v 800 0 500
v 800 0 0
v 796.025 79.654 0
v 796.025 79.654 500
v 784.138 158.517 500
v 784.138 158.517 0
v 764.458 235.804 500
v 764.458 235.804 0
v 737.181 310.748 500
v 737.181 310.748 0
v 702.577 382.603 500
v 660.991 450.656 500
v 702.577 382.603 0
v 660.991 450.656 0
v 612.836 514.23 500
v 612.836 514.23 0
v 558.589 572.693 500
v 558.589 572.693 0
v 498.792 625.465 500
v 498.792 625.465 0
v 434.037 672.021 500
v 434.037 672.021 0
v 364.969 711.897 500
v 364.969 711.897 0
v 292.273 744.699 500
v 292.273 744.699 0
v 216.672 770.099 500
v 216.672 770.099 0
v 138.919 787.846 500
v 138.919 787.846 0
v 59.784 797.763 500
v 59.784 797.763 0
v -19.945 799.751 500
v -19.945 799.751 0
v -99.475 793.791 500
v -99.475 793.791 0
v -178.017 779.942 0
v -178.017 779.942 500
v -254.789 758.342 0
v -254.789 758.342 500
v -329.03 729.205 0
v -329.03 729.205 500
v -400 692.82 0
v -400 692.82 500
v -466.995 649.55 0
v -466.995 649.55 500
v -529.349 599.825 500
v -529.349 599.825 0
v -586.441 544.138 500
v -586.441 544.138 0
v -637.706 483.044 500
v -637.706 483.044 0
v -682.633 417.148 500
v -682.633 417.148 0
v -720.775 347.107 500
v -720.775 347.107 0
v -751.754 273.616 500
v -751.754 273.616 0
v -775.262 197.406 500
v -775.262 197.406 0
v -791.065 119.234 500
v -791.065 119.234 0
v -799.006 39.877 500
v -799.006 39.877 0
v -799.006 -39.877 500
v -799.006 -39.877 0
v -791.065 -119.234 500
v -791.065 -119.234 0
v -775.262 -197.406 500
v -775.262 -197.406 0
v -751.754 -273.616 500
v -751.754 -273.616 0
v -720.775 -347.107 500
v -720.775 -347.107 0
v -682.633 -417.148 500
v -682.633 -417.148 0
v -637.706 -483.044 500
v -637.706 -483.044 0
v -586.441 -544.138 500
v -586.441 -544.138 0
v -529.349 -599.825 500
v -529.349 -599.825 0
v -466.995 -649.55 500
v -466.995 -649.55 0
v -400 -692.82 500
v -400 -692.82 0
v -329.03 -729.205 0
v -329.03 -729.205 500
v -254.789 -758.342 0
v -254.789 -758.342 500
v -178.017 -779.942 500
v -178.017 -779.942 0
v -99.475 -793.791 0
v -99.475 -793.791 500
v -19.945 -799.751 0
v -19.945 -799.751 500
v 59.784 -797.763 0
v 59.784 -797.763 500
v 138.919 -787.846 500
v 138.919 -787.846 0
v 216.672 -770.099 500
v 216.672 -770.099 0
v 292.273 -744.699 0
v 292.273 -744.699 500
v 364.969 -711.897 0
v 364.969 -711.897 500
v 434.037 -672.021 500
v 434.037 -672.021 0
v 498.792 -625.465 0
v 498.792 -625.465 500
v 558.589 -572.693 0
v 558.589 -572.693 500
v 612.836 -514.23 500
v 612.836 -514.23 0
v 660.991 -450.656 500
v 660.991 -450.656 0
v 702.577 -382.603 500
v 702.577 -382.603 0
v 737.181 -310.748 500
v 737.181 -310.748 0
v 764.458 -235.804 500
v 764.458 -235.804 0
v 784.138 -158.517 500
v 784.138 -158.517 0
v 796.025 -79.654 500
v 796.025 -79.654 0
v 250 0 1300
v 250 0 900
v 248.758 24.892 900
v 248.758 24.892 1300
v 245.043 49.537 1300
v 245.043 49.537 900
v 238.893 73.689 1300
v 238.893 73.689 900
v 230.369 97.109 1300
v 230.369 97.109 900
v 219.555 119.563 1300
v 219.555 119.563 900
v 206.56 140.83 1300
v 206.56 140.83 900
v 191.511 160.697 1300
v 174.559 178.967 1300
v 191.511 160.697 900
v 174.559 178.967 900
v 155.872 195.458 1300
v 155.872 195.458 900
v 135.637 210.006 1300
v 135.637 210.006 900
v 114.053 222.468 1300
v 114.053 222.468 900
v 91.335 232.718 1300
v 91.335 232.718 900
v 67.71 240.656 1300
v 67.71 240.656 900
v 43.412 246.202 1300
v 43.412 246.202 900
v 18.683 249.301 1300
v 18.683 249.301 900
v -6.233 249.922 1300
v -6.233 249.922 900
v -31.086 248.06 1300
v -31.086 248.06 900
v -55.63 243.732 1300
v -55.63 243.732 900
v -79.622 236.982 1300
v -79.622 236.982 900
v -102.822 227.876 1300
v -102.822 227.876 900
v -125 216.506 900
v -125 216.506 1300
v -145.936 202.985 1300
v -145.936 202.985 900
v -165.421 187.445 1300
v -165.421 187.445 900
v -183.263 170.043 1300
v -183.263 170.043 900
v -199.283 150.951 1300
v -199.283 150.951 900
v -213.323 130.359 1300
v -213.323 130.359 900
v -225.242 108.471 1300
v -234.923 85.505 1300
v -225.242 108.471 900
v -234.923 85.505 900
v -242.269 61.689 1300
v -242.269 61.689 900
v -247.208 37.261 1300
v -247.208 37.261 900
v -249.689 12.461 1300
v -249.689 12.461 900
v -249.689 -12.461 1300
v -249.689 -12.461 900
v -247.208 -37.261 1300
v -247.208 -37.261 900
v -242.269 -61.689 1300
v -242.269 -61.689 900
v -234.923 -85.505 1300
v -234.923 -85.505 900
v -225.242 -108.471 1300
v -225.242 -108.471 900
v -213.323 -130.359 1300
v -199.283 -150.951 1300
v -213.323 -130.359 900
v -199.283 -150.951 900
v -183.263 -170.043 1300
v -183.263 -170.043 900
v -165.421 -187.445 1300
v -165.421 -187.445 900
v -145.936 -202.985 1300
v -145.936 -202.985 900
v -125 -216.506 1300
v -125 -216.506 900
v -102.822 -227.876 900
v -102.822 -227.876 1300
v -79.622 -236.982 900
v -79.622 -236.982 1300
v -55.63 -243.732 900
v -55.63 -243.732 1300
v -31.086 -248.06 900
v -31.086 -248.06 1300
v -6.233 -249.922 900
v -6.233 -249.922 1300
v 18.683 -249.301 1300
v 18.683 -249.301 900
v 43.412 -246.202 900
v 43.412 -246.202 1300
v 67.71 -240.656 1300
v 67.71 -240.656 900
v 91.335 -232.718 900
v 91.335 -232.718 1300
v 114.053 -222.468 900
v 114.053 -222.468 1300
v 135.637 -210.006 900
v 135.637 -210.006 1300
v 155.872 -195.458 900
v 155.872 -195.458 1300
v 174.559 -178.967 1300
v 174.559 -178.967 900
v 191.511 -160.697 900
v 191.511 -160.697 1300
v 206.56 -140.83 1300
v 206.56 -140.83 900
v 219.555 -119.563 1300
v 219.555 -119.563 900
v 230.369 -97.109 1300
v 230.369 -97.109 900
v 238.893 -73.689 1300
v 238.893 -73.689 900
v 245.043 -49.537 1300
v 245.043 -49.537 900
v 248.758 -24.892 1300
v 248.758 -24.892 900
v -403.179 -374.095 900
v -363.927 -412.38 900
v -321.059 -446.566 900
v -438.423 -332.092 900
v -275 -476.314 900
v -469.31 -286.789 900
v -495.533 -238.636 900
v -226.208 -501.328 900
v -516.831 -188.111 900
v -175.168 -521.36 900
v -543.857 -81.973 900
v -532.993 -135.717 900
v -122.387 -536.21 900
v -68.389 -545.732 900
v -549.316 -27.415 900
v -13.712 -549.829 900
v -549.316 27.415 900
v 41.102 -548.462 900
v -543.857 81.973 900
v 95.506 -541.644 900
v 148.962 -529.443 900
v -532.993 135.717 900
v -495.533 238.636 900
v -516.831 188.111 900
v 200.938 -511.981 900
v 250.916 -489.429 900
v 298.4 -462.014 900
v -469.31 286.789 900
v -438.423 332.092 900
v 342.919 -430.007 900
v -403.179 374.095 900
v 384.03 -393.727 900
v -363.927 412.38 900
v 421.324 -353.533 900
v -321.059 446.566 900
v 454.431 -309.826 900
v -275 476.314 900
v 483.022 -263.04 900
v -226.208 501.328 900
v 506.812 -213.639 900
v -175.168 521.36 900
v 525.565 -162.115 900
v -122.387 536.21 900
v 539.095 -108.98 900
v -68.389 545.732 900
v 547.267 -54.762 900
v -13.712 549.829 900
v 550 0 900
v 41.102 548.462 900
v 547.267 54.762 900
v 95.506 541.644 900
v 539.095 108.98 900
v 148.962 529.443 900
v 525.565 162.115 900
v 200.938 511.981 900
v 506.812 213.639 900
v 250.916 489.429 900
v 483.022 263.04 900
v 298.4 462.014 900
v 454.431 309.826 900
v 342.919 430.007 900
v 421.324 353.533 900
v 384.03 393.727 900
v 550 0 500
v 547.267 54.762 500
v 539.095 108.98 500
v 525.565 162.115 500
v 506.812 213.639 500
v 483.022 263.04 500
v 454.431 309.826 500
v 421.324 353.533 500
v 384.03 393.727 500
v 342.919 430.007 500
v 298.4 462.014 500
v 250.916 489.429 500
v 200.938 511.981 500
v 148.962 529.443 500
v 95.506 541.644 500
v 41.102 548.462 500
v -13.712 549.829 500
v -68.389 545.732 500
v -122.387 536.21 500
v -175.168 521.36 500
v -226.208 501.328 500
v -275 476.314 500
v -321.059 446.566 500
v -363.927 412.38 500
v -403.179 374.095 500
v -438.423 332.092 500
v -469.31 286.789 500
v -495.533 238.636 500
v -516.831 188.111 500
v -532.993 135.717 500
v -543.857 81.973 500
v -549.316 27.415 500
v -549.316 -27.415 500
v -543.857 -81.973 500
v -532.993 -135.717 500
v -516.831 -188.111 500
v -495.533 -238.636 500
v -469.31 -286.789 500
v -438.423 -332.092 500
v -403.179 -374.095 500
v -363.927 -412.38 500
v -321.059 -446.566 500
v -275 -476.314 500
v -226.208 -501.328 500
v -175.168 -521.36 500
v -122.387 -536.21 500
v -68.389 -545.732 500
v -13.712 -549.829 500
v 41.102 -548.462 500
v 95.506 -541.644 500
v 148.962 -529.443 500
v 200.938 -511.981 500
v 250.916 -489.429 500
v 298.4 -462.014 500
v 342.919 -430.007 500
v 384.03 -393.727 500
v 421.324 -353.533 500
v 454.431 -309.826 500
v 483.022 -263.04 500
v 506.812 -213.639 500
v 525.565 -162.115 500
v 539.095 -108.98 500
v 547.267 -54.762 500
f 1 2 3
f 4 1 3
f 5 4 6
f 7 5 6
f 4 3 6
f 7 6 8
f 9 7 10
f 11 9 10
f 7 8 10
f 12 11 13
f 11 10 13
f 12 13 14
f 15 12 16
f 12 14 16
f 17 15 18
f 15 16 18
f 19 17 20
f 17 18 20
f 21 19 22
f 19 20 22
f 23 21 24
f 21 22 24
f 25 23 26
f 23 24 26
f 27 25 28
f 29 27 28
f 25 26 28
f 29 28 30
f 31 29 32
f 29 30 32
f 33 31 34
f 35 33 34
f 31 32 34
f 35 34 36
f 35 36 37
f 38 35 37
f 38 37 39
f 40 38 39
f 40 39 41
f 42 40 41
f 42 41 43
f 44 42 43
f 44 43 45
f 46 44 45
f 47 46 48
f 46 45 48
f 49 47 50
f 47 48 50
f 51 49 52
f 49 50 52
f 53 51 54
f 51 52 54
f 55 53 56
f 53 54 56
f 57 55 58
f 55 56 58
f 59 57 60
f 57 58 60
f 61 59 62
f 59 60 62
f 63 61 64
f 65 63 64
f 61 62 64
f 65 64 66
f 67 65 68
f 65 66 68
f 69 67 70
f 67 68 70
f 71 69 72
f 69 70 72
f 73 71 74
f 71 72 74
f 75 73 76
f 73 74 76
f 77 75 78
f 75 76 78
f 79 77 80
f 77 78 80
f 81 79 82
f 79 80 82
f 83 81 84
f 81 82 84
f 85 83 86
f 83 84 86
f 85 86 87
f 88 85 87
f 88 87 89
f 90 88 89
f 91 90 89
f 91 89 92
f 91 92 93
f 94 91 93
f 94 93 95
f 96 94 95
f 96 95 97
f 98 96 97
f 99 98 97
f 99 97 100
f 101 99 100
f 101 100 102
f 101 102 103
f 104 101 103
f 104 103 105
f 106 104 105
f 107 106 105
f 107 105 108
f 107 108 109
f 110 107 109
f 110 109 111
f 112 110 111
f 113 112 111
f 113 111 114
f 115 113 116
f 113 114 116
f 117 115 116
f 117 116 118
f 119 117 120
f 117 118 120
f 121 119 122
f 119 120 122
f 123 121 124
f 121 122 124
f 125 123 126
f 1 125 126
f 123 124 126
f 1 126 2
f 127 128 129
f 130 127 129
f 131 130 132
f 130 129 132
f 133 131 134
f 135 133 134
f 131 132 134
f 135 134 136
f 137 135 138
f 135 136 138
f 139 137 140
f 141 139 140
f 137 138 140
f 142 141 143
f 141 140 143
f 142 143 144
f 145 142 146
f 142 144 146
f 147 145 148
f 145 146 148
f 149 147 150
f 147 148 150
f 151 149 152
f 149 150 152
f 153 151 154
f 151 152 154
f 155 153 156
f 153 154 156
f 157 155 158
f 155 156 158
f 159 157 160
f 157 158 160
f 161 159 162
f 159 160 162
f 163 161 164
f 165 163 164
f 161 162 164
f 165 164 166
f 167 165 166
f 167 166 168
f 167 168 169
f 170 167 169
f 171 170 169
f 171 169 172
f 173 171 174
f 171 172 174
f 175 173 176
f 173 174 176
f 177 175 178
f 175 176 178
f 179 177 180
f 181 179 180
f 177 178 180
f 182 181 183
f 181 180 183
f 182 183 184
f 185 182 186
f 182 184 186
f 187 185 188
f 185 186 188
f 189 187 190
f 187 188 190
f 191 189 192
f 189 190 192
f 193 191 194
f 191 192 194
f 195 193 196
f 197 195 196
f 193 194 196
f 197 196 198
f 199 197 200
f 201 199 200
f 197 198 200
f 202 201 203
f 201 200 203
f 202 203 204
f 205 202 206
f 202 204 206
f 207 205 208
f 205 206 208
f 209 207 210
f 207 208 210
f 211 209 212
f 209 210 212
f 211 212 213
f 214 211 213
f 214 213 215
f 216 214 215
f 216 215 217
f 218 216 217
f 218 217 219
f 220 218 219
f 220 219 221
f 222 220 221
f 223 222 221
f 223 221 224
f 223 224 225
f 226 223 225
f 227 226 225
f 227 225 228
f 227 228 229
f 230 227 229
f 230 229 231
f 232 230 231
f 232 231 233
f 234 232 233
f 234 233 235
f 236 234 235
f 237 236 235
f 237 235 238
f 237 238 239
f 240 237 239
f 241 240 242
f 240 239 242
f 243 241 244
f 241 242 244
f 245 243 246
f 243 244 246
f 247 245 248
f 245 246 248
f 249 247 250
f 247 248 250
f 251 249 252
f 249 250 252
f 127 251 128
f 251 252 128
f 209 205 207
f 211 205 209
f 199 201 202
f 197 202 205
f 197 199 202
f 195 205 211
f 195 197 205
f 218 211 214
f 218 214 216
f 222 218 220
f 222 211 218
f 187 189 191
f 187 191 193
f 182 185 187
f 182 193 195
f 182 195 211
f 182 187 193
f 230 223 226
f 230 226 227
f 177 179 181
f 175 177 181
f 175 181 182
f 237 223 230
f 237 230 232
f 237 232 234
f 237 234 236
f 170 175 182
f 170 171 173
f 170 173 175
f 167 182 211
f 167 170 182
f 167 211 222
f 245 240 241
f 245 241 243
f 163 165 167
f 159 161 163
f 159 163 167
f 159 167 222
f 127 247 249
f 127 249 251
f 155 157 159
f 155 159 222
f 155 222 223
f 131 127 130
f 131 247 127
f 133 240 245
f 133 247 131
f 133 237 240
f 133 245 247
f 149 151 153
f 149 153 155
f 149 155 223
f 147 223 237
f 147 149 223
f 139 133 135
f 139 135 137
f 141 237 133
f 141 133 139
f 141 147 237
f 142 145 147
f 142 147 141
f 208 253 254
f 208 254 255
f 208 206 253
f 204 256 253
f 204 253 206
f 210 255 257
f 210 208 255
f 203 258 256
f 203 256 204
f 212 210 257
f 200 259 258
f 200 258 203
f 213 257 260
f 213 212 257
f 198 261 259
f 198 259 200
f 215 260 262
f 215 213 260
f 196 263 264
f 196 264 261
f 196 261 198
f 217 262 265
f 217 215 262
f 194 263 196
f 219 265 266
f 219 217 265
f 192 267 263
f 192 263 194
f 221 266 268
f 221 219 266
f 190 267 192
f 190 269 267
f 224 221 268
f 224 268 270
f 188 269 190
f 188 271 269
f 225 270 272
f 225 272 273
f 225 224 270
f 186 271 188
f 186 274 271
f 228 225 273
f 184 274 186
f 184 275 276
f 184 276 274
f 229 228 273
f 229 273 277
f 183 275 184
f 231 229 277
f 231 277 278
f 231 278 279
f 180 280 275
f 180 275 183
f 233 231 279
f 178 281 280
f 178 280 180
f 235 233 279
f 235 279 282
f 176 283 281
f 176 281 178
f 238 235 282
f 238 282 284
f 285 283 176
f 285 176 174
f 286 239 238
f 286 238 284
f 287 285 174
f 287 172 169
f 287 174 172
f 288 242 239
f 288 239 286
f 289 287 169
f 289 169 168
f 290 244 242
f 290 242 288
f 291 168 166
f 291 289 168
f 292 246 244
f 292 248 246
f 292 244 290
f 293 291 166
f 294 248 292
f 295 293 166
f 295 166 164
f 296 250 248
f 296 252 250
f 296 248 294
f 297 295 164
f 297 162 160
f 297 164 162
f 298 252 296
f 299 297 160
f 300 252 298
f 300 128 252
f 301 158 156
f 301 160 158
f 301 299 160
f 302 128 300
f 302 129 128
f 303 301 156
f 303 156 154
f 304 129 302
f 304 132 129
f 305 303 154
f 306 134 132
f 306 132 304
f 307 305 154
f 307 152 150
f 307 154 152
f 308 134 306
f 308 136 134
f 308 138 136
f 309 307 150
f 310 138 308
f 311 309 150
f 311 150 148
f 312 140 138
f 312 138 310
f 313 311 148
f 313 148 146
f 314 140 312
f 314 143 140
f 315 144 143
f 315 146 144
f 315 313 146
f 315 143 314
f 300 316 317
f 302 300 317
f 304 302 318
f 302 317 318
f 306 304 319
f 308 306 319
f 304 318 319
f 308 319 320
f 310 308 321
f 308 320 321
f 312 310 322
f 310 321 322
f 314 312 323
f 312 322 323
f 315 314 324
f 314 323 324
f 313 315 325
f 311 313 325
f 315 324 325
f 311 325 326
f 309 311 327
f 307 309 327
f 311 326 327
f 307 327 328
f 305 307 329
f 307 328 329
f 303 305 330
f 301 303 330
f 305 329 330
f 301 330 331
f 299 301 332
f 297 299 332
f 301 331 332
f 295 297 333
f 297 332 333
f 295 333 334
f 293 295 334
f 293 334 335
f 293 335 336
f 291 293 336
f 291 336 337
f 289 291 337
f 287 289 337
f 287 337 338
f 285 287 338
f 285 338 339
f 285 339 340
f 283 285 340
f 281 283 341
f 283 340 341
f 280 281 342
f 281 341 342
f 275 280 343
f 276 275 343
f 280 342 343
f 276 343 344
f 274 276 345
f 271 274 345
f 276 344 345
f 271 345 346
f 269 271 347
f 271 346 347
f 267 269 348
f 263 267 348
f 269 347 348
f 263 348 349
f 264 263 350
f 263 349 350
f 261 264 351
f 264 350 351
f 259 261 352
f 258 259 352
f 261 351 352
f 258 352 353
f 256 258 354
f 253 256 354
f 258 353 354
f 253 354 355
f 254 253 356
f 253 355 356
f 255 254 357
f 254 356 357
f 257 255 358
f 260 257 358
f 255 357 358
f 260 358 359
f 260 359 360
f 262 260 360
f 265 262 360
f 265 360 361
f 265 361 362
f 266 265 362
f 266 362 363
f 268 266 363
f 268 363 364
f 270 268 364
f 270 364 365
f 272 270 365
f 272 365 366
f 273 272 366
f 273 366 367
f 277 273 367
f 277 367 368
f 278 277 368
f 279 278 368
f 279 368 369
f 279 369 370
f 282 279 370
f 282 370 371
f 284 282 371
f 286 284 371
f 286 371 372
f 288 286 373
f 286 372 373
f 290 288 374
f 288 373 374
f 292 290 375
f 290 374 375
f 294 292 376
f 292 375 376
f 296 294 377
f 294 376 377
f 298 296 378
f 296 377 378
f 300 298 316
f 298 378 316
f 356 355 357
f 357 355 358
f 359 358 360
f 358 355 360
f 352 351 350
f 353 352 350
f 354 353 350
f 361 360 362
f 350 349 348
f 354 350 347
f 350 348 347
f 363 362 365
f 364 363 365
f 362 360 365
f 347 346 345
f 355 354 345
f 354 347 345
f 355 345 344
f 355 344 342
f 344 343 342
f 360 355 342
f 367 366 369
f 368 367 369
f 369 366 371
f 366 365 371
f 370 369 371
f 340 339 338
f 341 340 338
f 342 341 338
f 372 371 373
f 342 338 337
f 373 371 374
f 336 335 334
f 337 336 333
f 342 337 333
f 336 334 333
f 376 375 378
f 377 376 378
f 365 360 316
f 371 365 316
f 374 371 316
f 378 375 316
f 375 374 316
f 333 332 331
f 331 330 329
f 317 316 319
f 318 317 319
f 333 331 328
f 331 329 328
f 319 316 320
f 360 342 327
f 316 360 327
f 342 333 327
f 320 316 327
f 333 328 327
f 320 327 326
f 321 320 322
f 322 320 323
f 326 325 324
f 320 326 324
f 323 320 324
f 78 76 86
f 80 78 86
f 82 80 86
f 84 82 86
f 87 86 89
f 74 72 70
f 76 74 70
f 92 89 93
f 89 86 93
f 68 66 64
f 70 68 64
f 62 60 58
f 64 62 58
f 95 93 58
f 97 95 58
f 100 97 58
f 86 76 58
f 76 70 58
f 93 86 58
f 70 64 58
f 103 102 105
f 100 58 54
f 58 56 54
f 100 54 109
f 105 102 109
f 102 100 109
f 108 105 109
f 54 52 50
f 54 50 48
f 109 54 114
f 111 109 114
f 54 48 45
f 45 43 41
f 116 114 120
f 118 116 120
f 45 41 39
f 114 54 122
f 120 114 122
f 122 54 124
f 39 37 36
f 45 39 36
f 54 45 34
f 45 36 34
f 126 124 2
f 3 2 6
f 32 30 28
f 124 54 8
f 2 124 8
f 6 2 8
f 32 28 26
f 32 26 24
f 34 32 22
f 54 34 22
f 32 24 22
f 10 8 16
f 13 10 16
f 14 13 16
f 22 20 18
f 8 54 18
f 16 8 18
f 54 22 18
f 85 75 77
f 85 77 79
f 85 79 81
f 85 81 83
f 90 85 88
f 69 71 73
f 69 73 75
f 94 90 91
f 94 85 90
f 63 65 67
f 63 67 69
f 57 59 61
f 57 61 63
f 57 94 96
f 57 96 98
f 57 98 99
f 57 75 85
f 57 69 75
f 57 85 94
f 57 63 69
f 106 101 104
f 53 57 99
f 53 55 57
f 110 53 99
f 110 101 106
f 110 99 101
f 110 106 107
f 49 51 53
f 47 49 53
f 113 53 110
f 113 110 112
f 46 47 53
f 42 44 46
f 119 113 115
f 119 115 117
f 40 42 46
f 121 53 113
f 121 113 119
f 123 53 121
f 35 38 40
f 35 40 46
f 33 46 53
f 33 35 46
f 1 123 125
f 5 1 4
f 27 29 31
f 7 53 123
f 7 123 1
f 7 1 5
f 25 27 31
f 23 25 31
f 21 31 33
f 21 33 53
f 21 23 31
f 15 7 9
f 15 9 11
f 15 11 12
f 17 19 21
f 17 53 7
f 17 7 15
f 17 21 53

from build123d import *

# Parameters (mm, degrees)
F0_R     = 800
F1_DEPTH = 500
F2_R     = 550
F3_DEPTH = 400
F4_R     = 250
F5_DEPTH = 400


with BuildPart() as f1:
    # F0 (on Top) → F1 (new body)
    with BuildSketch(Plane.XY):
        Circle(F0_R)
    extrude(amount=F1_DEPTH)


with BuildPart() as f3:
    # F2 (on face) → F3 (new body)
    with BuildSketch(Plane.XY.offset(500)):
        Circle(F2_R)
    extrude(amount=F3_DEPTH)

    # F4 (on face) → F5 (join)
    with BuildSketch(Plane.XY.offset(900)):
        Circle(F4_R)
    extrude(amount=F5_DEPTH)


solid = Compound([f1.part, f3.part])
